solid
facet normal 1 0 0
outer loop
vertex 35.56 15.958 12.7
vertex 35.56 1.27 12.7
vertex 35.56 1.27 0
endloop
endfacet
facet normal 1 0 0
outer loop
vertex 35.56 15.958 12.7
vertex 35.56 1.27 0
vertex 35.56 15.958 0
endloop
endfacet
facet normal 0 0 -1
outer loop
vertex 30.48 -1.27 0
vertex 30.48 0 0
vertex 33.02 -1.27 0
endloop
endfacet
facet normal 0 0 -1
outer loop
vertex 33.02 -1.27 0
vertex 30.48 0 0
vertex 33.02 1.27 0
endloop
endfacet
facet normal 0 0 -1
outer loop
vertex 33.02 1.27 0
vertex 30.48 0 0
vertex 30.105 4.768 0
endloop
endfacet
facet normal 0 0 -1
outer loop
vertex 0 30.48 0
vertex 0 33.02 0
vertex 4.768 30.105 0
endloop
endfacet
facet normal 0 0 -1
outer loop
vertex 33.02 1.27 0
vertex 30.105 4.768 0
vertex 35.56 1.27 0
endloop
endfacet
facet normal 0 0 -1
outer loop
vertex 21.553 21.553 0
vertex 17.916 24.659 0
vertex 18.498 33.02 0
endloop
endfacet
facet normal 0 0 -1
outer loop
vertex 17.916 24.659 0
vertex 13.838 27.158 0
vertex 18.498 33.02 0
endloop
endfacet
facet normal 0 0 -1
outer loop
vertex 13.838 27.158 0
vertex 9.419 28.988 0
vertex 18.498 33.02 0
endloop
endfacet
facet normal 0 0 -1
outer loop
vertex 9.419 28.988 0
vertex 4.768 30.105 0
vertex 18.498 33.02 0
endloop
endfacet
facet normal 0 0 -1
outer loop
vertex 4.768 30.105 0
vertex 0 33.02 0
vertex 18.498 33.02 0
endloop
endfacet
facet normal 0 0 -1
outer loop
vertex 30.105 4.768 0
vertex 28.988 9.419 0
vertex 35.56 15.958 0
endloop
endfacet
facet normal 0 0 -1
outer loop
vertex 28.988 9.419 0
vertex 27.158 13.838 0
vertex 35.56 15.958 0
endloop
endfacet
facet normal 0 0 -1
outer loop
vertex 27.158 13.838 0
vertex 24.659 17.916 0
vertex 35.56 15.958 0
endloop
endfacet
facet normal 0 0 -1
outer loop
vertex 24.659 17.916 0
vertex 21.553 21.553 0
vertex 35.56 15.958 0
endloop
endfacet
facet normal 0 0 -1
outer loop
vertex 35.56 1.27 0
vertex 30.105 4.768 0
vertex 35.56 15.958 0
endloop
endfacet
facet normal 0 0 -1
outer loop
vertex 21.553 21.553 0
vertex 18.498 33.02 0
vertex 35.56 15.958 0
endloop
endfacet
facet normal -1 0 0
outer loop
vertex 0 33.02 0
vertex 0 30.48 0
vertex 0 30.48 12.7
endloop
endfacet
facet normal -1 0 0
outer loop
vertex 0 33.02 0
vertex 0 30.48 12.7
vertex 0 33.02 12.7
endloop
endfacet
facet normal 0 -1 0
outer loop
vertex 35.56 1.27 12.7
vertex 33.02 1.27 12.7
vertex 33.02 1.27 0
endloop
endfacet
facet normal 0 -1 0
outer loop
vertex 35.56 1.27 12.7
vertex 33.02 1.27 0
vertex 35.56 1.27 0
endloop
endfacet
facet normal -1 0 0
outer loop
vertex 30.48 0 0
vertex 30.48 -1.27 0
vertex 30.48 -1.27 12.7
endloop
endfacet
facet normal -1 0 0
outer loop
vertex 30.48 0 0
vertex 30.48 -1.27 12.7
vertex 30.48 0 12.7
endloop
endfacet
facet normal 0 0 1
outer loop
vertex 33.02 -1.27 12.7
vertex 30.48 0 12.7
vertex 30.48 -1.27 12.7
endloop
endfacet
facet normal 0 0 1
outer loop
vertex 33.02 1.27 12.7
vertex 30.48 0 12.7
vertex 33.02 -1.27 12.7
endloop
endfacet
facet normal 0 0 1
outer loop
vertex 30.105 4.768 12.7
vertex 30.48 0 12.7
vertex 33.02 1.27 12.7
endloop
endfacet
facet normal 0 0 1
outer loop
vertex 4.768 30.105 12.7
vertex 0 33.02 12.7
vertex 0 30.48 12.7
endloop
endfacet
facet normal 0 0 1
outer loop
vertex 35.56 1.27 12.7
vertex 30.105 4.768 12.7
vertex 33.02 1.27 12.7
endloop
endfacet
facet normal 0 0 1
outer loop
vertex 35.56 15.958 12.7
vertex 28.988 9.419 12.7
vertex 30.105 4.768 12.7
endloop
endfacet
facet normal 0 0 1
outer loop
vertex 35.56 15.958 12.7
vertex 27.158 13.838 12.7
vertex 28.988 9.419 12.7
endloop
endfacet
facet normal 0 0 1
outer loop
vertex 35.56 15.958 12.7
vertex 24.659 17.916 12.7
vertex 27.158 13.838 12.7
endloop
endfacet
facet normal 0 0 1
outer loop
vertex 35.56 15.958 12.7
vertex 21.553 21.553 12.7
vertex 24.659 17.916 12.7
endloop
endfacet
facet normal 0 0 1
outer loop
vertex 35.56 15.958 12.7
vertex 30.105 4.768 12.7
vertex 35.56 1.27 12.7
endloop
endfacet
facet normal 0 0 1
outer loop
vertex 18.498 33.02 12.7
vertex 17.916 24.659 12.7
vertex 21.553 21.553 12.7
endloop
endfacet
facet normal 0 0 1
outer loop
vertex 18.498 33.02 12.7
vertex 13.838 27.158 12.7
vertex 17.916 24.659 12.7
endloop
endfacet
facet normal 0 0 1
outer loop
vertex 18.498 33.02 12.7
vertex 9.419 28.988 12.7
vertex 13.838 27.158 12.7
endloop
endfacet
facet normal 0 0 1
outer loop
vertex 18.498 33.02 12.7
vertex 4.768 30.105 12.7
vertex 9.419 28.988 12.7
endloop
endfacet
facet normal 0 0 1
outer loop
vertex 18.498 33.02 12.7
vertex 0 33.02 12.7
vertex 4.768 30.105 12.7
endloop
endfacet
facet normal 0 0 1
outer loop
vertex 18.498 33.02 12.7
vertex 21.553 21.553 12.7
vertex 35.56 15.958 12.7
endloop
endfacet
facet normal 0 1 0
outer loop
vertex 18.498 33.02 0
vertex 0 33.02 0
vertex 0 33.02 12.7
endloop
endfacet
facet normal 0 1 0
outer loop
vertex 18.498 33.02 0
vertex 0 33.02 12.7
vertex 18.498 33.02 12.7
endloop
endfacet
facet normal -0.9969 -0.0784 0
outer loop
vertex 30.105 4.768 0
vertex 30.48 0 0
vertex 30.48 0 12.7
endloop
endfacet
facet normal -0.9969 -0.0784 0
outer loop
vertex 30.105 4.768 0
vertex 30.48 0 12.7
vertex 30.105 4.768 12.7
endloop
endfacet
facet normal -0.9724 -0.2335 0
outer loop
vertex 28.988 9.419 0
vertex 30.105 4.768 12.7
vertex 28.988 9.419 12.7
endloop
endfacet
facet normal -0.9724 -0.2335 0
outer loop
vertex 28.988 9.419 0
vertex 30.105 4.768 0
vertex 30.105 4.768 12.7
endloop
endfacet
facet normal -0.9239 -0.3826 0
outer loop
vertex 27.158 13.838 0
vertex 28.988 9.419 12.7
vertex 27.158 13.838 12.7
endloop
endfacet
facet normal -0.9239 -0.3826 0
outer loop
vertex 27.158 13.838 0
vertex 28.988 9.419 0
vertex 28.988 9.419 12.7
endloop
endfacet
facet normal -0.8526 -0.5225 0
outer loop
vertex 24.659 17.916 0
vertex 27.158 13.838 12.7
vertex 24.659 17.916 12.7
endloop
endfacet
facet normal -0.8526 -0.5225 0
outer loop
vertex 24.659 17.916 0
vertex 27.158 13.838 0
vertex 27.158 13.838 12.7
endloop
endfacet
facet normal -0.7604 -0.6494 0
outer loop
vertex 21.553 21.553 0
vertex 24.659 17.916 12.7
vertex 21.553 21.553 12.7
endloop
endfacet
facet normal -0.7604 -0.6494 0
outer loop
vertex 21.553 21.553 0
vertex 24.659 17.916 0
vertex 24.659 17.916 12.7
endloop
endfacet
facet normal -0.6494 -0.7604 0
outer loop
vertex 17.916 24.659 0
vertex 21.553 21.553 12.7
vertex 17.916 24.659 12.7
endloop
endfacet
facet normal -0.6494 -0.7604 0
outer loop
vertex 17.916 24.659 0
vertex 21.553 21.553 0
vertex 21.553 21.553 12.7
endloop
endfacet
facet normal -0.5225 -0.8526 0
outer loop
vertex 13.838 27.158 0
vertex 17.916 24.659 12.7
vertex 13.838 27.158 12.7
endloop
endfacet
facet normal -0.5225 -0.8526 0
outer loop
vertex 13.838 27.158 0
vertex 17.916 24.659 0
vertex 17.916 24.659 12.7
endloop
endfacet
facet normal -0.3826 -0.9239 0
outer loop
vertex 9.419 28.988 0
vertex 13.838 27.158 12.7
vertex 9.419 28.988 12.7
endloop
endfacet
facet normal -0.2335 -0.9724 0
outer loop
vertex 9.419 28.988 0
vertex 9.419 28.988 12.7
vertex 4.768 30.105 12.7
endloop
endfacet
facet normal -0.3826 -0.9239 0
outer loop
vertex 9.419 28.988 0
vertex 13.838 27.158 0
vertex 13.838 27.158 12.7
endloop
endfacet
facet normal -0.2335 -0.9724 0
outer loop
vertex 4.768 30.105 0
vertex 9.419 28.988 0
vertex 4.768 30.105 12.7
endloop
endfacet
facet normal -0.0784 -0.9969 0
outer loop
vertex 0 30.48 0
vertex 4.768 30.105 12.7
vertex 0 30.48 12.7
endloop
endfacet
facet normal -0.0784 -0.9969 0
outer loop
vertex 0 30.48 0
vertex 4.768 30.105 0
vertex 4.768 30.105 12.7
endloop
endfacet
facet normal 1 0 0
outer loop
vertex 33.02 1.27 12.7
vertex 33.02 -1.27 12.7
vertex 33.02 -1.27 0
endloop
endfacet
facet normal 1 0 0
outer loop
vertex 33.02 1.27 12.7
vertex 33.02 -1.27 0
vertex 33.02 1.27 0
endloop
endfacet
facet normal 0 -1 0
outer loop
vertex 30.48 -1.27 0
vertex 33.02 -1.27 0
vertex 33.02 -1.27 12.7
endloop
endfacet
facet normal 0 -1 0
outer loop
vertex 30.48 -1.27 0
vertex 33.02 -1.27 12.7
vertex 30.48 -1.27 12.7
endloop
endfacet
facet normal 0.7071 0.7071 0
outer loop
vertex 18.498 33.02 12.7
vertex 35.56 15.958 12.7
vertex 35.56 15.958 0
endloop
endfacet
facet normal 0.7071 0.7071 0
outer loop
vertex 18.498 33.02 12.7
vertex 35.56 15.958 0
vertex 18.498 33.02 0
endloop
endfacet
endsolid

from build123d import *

# Parameters (mm, degrees)
BOSS_EXTRUDE2_DEPTH = 12.7
SKETCH3_W           = 5.08
SKETCH3_H           = 25.4
CUT_EXTRUDE1_DEPTH  = 52.992503306
BOSS_EXTRUDE3_DEPTH = 12.7


with BuildPart() as part:
    # Sketch2 → Boss-Extrude2 (new body)
    with BuildSketch(Plane.XY):
        with BuildLine():
            Line((0, 30.48), (0, 33.02))
            Line((0, 33.02), (18.49751337, 33.02))
            Line((18.49751337, 33.02), (35.56, 15.95751337))
            Line((35.56, 15.95751337), (38.1, -1.27))
            Line((38.1, -1.27), (35.56, -1.27))
            Line((35.56, -1.27), (30.48, -1.27))
            Line((30.48, -1.27), (30.48, 0))
            ThreePointArc((30.48, 0), (21.552614691, 21.552614691), (0, 30.48))
        make_face()
    extrude(amount=BOSS_EXTRUDE2_DEPTH)

    # Sketch3 → Cut-Extrude1 (cut, through all)
    with BuildSketch(Plane.XY.offset(12.7)):
        with Locations((35.56, 11.43)):
            Rectangle(SKETCH3_W, SKETCH3_H)
    extrude(amount=-CUT_EXTRUDE1_DEPTH, mode=Mode.SUBTRACT)

    # Sketch4 → Boss-Extrude3 (add)
    with BuildSketch(Plane.XY.offset(12.7)):
        Polygon((33.02, 1.27), (35.56, 1.27), (35.56, 15.95751337), (33.02, 18.49751337), align=None)
    extrude(amount=-BOSS_EXTRUDE3_DEPTH)


solid = part.part
